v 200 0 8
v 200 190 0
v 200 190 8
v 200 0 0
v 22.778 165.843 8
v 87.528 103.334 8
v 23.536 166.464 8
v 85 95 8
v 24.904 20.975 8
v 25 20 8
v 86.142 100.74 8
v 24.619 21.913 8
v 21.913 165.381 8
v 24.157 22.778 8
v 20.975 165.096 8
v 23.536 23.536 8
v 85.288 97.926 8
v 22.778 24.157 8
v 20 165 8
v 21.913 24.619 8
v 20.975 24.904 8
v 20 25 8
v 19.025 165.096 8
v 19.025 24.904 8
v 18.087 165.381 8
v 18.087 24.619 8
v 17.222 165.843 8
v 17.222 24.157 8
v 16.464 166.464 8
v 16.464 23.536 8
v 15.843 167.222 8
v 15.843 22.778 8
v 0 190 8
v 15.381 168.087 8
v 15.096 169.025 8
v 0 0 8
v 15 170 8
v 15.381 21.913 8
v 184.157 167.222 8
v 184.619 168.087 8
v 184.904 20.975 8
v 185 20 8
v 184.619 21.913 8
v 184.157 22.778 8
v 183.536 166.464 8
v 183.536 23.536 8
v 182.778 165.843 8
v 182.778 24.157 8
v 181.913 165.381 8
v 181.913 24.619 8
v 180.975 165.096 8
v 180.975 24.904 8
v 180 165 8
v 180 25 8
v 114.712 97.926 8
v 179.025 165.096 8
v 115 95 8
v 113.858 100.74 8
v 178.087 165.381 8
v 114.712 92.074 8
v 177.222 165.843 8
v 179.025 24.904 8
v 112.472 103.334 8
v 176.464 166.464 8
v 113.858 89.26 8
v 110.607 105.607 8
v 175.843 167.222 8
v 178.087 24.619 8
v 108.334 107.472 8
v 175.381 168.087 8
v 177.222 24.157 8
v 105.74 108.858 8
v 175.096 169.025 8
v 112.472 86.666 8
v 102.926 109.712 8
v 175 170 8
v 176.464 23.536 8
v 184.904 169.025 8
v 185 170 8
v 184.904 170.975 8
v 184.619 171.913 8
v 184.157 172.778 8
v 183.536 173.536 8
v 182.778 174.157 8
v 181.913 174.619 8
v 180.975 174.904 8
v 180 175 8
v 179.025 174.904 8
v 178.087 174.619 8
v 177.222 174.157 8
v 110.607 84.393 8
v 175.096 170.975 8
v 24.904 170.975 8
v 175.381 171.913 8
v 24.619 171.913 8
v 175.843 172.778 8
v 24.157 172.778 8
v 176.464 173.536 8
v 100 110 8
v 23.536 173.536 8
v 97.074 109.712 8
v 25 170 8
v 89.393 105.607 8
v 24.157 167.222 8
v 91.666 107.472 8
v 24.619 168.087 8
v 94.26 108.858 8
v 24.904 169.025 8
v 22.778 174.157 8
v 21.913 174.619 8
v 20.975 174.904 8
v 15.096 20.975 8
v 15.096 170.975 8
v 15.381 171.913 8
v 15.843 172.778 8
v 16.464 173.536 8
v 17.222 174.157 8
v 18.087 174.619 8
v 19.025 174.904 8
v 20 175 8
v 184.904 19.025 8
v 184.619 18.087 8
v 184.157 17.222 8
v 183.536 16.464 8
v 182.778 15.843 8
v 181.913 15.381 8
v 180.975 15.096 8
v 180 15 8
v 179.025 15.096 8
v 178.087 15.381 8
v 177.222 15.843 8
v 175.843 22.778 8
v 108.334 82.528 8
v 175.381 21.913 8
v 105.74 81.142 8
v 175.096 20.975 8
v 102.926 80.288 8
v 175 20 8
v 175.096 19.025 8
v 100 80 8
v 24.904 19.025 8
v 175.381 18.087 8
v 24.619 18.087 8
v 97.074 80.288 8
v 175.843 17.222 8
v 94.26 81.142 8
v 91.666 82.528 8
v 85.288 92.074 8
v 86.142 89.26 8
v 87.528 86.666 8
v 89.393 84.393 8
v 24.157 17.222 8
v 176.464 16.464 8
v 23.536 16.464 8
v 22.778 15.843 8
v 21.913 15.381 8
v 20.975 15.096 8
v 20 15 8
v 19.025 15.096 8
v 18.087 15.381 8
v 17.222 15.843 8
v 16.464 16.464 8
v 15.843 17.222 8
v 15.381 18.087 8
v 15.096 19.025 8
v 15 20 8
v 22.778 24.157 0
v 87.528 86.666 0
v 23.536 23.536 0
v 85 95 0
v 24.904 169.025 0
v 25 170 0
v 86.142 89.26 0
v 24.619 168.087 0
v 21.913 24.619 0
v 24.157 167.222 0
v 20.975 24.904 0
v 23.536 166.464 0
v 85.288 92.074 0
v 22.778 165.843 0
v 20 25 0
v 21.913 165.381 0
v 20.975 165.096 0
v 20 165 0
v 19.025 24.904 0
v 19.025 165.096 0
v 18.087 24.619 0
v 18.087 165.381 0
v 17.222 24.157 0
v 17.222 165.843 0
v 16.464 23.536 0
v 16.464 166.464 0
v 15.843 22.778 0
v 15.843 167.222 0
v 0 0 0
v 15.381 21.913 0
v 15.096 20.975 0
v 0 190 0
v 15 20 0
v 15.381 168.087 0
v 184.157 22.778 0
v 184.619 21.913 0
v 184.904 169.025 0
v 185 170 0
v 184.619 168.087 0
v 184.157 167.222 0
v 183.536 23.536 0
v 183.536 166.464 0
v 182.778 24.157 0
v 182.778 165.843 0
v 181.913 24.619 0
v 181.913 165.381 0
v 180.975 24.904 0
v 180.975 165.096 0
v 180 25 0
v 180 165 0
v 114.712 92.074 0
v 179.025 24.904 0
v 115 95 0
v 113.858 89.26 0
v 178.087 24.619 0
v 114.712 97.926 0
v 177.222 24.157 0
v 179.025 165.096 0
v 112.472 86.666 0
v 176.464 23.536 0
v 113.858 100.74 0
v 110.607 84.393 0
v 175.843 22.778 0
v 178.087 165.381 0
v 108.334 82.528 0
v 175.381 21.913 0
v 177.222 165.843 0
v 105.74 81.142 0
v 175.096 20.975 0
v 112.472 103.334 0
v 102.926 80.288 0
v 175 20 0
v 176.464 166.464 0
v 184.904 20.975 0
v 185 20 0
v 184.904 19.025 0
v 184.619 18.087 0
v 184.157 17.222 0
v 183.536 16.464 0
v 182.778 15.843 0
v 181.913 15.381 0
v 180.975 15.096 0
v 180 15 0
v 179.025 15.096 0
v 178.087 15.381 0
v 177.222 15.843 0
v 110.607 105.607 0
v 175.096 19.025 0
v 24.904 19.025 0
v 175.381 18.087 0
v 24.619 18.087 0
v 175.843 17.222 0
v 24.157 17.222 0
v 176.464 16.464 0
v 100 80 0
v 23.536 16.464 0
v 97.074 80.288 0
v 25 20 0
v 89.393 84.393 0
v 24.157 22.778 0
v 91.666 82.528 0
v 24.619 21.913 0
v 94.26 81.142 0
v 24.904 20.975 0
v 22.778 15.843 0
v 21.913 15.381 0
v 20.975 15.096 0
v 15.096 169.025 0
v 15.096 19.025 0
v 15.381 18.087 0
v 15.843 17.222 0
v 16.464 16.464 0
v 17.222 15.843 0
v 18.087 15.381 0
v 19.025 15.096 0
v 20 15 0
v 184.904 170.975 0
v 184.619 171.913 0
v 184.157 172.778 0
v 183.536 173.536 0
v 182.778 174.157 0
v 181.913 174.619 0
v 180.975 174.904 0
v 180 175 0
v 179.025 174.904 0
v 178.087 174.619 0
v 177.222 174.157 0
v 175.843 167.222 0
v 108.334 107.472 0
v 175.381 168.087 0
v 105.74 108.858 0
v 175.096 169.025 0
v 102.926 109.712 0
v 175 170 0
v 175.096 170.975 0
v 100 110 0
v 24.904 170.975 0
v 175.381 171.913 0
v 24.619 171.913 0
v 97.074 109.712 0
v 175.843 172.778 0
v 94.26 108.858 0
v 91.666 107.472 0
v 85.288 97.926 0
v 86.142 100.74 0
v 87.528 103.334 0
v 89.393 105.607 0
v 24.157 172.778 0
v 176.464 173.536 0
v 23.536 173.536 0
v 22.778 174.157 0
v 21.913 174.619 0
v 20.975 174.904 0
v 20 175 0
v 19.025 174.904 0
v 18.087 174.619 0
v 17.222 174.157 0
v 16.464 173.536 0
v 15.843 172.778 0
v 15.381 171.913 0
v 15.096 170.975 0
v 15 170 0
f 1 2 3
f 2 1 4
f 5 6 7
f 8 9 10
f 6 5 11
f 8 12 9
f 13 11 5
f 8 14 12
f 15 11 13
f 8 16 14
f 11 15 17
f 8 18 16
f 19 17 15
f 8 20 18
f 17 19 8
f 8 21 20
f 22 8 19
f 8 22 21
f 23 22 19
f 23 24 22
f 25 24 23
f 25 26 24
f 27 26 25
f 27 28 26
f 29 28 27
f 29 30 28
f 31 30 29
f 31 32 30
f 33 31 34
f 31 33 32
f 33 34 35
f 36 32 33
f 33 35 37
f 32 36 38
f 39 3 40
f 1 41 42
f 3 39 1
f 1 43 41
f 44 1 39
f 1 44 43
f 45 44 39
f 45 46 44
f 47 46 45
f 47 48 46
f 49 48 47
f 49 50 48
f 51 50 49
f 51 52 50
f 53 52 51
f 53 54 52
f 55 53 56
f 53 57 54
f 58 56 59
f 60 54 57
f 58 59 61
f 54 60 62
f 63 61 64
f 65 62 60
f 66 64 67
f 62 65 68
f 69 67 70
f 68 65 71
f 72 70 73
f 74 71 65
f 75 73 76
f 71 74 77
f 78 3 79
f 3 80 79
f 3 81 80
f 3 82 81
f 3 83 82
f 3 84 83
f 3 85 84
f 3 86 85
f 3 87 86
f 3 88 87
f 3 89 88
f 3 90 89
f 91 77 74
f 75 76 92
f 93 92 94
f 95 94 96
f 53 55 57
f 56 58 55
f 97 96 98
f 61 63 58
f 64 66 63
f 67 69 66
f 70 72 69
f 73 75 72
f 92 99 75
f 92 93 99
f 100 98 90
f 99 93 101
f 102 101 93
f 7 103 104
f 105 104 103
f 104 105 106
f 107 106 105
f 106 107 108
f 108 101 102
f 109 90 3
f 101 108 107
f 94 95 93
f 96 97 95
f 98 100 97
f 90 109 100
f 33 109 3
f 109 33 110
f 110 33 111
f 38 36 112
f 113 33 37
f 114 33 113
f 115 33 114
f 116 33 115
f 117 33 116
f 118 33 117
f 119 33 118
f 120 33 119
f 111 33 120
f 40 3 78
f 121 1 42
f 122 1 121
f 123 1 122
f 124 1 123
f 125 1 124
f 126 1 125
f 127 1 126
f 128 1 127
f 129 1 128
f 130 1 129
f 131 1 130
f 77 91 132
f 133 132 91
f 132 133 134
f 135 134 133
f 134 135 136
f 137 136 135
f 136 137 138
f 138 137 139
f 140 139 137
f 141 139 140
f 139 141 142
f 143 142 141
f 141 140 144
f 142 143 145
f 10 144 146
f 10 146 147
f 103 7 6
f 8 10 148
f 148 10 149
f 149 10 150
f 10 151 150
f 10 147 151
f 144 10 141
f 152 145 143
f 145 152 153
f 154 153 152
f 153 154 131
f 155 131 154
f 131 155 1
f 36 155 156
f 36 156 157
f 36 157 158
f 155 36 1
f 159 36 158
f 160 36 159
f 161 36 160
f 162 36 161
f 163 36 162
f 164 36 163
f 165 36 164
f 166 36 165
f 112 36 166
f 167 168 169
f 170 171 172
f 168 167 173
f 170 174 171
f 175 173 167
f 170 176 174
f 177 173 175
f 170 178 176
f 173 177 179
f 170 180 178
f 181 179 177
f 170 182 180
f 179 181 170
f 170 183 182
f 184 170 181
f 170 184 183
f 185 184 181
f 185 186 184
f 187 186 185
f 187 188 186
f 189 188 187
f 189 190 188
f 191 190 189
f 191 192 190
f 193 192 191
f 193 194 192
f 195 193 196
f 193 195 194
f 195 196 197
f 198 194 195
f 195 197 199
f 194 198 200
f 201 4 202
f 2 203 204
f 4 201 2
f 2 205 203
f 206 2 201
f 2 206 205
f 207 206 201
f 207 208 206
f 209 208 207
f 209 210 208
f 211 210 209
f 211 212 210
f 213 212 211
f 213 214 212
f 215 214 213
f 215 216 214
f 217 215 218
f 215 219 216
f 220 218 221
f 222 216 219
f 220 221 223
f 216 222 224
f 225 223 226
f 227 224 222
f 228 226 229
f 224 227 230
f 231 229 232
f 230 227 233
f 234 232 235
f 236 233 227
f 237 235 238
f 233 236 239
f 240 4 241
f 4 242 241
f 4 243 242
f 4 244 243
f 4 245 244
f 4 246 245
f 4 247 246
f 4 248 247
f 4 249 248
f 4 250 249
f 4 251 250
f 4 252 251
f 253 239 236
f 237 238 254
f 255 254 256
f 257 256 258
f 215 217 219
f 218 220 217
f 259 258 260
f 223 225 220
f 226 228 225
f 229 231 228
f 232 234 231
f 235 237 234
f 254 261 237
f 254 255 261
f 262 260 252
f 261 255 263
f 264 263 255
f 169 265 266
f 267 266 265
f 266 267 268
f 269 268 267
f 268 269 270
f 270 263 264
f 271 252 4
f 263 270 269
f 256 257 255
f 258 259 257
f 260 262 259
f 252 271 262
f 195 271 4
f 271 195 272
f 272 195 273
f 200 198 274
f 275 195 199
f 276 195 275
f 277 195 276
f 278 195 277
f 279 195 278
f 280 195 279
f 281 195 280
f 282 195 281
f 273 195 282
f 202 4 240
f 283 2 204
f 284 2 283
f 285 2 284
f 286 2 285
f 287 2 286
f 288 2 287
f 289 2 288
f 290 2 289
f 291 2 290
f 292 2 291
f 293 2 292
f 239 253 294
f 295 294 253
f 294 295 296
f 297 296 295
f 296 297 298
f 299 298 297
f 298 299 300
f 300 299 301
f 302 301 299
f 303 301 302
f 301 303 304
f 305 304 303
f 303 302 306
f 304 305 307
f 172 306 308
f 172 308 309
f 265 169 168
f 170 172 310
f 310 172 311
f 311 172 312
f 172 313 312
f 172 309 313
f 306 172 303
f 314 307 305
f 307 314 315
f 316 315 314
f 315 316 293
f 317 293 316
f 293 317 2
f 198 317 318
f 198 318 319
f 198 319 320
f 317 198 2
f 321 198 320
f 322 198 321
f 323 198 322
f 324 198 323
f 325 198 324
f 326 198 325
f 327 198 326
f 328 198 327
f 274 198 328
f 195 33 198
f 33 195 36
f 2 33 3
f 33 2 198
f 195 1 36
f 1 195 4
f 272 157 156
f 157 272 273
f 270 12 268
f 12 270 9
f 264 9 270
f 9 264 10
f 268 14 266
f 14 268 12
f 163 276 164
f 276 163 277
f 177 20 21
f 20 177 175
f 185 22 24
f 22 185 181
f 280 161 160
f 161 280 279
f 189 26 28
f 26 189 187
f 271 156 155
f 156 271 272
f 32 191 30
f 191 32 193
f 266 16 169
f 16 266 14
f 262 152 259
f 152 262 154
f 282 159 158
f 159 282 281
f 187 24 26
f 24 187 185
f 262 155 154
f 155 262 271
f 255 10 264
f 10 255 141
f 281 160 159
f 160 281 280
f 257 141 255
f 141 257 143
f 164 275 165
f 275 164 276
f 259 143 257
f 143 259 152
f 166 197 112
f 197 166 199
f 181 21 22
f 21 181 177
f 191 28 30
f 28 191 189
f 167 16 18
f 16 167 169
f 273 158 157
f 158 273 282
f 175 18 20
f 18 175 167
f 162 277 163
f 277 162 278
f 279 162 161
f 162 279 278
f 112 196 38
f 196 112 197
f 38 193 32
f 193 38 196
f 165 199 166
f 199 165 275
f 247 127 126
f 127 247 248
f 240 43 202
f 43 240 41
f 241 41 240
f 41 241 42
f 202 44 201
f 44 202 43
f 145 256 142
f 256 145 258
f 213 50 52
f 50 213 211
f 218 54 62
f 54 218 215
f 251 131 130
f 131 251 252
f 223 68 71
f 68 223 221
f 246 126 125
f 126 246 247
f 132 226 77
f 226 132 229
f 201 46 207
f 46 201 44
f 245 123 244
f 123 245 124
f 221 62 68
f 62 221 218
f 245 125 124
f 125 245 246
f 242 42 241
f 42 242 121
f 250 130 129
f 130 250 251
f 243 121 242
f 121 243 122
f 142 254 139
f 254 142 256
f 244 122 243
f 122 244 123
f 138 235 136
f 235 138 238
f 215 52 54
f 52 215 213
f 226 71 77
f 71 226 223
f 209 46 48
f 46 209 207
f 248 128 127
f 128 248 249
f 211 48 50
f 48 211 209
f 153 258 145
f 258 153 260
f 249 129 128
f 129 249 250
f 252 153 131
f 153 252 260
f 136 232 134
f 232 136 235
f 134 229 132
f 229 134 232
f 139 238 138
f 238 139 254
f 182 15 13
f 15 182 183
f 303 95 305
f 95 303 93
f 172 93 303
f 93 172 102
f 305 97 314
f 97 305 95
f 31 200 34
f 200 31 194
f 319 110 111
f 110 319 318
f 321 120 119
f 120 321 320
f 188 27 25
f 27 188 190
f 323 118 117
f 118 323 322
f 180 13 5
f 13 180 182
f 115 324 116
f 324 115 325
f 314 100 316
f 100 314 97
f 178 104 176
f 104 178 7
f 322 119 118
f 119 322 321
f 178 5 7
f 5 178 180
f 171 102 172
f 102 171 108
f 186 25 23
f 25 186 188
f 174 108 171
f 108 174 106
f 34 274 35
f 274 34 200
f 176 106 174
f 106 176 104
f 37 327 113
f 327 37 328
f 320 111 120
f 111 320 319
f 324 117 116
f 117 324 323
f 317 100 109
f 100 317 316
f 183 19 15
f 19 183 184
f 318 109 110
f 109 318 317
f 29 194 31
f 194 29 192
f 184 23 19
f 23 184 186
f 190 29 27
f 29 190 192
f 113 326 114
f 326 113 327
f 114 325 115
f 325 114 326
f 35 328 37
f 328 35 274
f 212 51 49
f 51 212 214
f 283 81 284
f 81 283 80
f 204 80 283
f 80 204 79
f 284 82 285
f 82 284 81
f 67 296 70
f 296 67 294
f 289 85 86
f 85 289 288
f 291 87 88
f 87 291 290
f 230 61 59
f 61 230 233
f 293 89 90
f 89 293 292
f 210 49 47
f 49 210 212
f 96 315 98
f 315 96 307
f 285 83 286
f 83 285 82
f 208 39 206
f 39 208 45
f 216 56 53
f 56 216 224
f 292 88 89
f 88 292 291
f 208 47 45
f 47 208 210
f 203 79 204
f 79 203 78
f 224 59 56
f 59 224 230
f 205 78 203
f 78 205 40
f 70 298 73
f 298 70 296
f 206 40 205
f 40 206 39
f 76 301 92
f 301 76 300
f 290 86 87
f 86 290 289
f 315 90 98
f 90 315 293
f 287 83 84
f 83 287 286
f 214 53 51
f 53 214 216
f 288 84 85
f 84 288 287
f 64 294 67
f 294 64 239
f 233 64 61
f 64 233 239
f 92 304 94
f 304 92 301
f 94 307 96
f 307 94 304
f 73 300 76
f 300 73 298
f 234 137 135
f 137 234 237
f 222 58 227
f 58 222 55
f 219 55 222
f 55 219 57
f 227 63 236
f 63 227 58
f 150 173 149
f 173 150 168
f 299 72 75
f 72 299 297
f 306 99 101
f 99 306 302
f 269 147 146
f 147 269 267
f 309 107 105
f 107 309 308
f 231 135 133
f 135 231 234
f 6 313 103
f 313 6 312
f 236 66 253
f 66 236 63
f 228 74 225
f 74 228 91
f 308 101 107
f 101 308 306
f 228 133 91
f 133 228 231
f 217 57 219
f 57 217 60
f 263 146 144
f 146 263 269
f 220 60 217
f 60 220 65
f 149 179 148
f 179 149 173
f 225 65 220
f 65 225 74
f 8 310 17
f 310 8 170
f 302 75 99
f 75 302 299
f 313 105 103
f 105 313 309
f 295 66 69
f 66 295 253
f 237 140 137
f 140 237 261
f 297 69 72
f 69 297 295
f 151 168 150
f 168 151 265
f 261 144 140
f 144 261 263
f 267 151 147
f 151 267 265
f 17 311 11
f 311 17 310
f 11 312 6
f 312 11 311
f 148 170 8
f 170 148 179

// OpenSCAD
$fn = 32;

// ----------------------------------------------------------------------
// Big plate: 200-250 mm adapter plate
// ----------------------------------------------------------------------

// --- parameters (mm) ---
plate_l = 200;            // plate length, X
plate_w = 190;            // plate width, Y
plate_t = 8;              // plate thickness, Z
corner_d = 10;            // corner hole diameter
corner_in = 20;           // corner hole inset from the edges
bore_d = 30;              // central bore

difference() {
  cube([plate_l, plate_w, plate_t]);
  translate([corner_in, corner_in, -1]) cylinder(h = plate_t + 2, d = corner_d);
  translate([plate_l - corner_in, corner_in, -1]) cylinder(h = plate_t + 2, d = corner_d);
  translate([corner_in, plate_w - corner_in, -1]) cylinder(h = plate_t + 2, d = corner_d);
  translate([plate_l - corner_in, plate_w - corner_in, -1]) cylinder(h = plate_t + 2, d = corner_d);
  translate([plate_l / 2, plate_w / 2, -1]) cylinder(h = plate_t + 2, d = bore_d);
}
